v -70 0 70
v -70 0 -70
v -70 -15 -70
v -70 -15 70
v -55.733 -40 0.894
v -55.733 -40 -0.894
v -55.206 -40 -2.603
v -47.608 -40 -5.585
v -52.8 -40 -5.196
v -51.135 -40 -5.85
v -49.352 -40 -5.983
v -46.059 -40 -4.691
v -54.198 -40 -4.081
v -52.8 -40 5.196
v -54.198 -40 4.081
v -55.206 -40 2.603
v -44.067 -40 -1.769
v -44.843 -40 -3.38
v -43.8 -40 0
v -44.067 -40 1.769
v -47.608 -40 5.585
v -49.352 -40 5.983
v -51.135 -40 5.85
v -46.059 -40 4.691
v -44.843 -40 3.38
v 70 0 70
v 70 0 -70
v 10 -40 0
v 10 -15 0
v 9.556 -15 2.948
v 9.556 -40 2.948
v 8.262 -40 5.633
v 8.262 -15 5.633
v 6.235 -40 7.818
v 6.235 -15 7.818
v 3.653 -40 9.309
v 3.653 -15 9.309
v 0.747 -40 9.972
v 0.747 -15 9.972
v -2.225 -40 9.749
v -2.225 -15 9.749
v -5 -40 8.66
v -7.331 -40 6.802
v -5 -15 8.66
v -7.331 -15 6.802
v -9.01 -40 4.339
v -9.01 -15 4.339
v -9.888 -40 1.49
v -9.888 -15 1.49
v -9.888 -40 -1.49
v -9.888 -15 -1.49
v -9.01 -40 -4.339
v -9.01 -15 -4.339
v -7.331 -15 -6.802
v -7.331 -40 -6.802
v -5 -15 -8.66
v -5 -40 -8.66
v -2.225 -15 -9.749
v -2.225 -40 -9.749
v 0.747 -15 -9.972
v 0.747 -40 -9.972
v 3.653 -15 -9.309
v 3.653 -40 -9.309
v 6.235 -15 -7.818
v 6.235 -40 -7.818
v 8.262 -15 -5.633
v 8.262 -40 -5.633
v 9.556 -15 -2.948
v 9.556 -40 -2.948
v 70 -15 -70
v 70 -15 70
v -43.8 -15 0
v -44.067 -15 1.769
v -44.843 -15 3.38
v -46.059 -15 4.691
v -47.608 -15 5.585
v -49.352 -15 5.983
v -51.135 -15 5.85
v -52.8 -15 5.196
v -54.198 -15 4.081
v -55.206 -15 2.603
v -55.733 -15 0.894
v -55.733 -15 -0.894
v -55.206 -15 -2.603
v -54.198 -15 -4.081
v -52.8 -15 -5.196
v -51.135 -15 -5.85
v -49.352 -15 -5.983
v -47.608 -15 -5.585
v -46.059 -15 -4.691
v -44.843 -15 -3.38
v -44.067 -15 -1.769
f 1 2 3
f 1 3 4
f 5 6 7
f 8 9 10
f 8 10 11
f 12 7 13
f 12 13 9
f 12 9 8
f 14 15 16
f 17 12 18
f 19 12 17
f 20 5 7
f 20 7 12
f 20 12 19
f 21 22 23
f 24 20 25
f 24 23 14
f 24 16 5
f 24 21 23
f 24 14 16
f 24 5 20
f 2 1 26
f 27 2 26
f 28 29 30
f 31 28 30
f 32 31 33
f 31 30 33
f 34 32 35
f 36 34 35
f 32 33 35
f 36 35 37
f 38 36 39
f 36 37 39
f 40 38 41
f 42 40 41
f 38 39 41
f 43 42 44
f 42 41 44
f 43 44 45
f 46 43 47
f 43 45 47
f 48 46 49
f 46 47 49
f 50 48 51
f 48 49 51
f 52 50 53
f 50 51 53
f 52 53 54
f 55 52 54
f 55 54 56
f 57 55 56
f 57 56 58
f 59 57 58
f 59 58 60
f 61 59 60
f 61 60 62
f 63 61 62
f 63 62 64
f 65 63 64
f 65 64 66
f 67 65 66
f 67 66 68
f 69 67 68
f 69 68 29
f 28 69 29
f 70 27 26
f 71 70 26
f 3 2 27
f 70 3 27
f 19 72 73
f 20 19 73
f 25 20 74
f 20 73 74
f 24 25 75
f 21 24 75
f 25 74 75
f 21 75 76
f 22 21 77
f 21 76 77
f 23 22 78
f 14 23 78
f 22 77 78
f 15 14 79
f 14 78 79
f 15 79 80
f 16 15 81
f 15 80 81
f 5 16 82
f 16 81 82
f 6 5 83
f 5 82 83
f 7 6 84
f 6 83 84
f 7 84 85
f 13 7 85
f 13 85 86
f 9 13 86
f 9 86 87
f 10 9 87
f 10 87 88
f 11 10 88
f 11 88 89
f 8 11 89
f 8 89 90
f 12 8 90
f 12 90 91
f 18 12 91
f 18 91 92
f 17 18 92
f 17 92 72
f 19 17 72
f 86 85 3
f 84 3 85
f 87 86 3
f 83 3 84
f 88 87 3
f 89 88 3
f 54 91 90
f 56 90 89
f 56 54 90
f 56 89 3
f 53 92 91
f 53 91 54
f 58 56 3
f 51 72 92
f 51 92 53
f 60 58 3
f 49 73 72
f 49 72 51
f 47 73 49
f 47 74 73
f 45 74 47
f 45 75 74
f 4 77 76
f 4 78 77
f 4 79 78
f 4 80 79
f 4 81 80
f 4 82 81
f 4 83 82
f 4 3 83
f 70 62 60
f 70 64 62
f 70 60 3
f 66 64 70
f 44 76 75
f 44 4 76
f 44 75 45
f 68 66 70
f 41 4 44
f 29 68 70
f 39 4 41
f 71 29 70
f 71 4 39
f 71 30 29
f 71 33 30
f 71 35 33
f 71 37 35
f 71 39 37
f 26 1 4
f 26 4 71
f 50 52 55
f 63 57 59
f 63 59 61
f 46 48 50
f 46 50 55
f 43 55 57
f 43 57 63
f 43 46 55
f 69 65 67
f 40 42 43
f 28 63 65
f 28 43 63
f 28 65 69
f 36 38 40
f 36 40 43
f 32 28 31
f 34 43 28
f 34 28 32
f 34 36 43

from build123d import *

# Parameters (mm, degrees)
F0_R     = 6
F1_DEPTH = 40
F0_R_2   = 10
F0_W     = 140
F0_H     = 140
F2_DEPTH = 15


with BuildPart() as f1:
    # F0 (on Front) → F1 (new body)
    with BuildSketch(Plane.XZ):
        with Locations((-49.8, 0)):
            Circle(F0_R)
    extrude(amount=F1_DEPTH)



with BuildPart() as f1b:
    # F0 (on Front) → F1, piece 2 (new body)
    with BuildSketch(Plane.XZ):
        Circle(F0_R_2)
    extrude(amount=F1_DEPTH)


with BuildPart() as f1_1:
    add(f1.part)

    add(f1b.part)  # F2 merges F1b
    # F0 (on Front) → F2 (join)
    with BuildSketch(Plane.XZ):
        Rectangle(F0_W, F0_H)
        with Locations((-49.8, 0)):
            Circle(F0_R, mode=Mode.SUBTRACT)
        Circle(F0_R_2, mode=Mode.SUBTRACT)
    extrude(amount=F2_DEPTH)


solid = f1_1.part
